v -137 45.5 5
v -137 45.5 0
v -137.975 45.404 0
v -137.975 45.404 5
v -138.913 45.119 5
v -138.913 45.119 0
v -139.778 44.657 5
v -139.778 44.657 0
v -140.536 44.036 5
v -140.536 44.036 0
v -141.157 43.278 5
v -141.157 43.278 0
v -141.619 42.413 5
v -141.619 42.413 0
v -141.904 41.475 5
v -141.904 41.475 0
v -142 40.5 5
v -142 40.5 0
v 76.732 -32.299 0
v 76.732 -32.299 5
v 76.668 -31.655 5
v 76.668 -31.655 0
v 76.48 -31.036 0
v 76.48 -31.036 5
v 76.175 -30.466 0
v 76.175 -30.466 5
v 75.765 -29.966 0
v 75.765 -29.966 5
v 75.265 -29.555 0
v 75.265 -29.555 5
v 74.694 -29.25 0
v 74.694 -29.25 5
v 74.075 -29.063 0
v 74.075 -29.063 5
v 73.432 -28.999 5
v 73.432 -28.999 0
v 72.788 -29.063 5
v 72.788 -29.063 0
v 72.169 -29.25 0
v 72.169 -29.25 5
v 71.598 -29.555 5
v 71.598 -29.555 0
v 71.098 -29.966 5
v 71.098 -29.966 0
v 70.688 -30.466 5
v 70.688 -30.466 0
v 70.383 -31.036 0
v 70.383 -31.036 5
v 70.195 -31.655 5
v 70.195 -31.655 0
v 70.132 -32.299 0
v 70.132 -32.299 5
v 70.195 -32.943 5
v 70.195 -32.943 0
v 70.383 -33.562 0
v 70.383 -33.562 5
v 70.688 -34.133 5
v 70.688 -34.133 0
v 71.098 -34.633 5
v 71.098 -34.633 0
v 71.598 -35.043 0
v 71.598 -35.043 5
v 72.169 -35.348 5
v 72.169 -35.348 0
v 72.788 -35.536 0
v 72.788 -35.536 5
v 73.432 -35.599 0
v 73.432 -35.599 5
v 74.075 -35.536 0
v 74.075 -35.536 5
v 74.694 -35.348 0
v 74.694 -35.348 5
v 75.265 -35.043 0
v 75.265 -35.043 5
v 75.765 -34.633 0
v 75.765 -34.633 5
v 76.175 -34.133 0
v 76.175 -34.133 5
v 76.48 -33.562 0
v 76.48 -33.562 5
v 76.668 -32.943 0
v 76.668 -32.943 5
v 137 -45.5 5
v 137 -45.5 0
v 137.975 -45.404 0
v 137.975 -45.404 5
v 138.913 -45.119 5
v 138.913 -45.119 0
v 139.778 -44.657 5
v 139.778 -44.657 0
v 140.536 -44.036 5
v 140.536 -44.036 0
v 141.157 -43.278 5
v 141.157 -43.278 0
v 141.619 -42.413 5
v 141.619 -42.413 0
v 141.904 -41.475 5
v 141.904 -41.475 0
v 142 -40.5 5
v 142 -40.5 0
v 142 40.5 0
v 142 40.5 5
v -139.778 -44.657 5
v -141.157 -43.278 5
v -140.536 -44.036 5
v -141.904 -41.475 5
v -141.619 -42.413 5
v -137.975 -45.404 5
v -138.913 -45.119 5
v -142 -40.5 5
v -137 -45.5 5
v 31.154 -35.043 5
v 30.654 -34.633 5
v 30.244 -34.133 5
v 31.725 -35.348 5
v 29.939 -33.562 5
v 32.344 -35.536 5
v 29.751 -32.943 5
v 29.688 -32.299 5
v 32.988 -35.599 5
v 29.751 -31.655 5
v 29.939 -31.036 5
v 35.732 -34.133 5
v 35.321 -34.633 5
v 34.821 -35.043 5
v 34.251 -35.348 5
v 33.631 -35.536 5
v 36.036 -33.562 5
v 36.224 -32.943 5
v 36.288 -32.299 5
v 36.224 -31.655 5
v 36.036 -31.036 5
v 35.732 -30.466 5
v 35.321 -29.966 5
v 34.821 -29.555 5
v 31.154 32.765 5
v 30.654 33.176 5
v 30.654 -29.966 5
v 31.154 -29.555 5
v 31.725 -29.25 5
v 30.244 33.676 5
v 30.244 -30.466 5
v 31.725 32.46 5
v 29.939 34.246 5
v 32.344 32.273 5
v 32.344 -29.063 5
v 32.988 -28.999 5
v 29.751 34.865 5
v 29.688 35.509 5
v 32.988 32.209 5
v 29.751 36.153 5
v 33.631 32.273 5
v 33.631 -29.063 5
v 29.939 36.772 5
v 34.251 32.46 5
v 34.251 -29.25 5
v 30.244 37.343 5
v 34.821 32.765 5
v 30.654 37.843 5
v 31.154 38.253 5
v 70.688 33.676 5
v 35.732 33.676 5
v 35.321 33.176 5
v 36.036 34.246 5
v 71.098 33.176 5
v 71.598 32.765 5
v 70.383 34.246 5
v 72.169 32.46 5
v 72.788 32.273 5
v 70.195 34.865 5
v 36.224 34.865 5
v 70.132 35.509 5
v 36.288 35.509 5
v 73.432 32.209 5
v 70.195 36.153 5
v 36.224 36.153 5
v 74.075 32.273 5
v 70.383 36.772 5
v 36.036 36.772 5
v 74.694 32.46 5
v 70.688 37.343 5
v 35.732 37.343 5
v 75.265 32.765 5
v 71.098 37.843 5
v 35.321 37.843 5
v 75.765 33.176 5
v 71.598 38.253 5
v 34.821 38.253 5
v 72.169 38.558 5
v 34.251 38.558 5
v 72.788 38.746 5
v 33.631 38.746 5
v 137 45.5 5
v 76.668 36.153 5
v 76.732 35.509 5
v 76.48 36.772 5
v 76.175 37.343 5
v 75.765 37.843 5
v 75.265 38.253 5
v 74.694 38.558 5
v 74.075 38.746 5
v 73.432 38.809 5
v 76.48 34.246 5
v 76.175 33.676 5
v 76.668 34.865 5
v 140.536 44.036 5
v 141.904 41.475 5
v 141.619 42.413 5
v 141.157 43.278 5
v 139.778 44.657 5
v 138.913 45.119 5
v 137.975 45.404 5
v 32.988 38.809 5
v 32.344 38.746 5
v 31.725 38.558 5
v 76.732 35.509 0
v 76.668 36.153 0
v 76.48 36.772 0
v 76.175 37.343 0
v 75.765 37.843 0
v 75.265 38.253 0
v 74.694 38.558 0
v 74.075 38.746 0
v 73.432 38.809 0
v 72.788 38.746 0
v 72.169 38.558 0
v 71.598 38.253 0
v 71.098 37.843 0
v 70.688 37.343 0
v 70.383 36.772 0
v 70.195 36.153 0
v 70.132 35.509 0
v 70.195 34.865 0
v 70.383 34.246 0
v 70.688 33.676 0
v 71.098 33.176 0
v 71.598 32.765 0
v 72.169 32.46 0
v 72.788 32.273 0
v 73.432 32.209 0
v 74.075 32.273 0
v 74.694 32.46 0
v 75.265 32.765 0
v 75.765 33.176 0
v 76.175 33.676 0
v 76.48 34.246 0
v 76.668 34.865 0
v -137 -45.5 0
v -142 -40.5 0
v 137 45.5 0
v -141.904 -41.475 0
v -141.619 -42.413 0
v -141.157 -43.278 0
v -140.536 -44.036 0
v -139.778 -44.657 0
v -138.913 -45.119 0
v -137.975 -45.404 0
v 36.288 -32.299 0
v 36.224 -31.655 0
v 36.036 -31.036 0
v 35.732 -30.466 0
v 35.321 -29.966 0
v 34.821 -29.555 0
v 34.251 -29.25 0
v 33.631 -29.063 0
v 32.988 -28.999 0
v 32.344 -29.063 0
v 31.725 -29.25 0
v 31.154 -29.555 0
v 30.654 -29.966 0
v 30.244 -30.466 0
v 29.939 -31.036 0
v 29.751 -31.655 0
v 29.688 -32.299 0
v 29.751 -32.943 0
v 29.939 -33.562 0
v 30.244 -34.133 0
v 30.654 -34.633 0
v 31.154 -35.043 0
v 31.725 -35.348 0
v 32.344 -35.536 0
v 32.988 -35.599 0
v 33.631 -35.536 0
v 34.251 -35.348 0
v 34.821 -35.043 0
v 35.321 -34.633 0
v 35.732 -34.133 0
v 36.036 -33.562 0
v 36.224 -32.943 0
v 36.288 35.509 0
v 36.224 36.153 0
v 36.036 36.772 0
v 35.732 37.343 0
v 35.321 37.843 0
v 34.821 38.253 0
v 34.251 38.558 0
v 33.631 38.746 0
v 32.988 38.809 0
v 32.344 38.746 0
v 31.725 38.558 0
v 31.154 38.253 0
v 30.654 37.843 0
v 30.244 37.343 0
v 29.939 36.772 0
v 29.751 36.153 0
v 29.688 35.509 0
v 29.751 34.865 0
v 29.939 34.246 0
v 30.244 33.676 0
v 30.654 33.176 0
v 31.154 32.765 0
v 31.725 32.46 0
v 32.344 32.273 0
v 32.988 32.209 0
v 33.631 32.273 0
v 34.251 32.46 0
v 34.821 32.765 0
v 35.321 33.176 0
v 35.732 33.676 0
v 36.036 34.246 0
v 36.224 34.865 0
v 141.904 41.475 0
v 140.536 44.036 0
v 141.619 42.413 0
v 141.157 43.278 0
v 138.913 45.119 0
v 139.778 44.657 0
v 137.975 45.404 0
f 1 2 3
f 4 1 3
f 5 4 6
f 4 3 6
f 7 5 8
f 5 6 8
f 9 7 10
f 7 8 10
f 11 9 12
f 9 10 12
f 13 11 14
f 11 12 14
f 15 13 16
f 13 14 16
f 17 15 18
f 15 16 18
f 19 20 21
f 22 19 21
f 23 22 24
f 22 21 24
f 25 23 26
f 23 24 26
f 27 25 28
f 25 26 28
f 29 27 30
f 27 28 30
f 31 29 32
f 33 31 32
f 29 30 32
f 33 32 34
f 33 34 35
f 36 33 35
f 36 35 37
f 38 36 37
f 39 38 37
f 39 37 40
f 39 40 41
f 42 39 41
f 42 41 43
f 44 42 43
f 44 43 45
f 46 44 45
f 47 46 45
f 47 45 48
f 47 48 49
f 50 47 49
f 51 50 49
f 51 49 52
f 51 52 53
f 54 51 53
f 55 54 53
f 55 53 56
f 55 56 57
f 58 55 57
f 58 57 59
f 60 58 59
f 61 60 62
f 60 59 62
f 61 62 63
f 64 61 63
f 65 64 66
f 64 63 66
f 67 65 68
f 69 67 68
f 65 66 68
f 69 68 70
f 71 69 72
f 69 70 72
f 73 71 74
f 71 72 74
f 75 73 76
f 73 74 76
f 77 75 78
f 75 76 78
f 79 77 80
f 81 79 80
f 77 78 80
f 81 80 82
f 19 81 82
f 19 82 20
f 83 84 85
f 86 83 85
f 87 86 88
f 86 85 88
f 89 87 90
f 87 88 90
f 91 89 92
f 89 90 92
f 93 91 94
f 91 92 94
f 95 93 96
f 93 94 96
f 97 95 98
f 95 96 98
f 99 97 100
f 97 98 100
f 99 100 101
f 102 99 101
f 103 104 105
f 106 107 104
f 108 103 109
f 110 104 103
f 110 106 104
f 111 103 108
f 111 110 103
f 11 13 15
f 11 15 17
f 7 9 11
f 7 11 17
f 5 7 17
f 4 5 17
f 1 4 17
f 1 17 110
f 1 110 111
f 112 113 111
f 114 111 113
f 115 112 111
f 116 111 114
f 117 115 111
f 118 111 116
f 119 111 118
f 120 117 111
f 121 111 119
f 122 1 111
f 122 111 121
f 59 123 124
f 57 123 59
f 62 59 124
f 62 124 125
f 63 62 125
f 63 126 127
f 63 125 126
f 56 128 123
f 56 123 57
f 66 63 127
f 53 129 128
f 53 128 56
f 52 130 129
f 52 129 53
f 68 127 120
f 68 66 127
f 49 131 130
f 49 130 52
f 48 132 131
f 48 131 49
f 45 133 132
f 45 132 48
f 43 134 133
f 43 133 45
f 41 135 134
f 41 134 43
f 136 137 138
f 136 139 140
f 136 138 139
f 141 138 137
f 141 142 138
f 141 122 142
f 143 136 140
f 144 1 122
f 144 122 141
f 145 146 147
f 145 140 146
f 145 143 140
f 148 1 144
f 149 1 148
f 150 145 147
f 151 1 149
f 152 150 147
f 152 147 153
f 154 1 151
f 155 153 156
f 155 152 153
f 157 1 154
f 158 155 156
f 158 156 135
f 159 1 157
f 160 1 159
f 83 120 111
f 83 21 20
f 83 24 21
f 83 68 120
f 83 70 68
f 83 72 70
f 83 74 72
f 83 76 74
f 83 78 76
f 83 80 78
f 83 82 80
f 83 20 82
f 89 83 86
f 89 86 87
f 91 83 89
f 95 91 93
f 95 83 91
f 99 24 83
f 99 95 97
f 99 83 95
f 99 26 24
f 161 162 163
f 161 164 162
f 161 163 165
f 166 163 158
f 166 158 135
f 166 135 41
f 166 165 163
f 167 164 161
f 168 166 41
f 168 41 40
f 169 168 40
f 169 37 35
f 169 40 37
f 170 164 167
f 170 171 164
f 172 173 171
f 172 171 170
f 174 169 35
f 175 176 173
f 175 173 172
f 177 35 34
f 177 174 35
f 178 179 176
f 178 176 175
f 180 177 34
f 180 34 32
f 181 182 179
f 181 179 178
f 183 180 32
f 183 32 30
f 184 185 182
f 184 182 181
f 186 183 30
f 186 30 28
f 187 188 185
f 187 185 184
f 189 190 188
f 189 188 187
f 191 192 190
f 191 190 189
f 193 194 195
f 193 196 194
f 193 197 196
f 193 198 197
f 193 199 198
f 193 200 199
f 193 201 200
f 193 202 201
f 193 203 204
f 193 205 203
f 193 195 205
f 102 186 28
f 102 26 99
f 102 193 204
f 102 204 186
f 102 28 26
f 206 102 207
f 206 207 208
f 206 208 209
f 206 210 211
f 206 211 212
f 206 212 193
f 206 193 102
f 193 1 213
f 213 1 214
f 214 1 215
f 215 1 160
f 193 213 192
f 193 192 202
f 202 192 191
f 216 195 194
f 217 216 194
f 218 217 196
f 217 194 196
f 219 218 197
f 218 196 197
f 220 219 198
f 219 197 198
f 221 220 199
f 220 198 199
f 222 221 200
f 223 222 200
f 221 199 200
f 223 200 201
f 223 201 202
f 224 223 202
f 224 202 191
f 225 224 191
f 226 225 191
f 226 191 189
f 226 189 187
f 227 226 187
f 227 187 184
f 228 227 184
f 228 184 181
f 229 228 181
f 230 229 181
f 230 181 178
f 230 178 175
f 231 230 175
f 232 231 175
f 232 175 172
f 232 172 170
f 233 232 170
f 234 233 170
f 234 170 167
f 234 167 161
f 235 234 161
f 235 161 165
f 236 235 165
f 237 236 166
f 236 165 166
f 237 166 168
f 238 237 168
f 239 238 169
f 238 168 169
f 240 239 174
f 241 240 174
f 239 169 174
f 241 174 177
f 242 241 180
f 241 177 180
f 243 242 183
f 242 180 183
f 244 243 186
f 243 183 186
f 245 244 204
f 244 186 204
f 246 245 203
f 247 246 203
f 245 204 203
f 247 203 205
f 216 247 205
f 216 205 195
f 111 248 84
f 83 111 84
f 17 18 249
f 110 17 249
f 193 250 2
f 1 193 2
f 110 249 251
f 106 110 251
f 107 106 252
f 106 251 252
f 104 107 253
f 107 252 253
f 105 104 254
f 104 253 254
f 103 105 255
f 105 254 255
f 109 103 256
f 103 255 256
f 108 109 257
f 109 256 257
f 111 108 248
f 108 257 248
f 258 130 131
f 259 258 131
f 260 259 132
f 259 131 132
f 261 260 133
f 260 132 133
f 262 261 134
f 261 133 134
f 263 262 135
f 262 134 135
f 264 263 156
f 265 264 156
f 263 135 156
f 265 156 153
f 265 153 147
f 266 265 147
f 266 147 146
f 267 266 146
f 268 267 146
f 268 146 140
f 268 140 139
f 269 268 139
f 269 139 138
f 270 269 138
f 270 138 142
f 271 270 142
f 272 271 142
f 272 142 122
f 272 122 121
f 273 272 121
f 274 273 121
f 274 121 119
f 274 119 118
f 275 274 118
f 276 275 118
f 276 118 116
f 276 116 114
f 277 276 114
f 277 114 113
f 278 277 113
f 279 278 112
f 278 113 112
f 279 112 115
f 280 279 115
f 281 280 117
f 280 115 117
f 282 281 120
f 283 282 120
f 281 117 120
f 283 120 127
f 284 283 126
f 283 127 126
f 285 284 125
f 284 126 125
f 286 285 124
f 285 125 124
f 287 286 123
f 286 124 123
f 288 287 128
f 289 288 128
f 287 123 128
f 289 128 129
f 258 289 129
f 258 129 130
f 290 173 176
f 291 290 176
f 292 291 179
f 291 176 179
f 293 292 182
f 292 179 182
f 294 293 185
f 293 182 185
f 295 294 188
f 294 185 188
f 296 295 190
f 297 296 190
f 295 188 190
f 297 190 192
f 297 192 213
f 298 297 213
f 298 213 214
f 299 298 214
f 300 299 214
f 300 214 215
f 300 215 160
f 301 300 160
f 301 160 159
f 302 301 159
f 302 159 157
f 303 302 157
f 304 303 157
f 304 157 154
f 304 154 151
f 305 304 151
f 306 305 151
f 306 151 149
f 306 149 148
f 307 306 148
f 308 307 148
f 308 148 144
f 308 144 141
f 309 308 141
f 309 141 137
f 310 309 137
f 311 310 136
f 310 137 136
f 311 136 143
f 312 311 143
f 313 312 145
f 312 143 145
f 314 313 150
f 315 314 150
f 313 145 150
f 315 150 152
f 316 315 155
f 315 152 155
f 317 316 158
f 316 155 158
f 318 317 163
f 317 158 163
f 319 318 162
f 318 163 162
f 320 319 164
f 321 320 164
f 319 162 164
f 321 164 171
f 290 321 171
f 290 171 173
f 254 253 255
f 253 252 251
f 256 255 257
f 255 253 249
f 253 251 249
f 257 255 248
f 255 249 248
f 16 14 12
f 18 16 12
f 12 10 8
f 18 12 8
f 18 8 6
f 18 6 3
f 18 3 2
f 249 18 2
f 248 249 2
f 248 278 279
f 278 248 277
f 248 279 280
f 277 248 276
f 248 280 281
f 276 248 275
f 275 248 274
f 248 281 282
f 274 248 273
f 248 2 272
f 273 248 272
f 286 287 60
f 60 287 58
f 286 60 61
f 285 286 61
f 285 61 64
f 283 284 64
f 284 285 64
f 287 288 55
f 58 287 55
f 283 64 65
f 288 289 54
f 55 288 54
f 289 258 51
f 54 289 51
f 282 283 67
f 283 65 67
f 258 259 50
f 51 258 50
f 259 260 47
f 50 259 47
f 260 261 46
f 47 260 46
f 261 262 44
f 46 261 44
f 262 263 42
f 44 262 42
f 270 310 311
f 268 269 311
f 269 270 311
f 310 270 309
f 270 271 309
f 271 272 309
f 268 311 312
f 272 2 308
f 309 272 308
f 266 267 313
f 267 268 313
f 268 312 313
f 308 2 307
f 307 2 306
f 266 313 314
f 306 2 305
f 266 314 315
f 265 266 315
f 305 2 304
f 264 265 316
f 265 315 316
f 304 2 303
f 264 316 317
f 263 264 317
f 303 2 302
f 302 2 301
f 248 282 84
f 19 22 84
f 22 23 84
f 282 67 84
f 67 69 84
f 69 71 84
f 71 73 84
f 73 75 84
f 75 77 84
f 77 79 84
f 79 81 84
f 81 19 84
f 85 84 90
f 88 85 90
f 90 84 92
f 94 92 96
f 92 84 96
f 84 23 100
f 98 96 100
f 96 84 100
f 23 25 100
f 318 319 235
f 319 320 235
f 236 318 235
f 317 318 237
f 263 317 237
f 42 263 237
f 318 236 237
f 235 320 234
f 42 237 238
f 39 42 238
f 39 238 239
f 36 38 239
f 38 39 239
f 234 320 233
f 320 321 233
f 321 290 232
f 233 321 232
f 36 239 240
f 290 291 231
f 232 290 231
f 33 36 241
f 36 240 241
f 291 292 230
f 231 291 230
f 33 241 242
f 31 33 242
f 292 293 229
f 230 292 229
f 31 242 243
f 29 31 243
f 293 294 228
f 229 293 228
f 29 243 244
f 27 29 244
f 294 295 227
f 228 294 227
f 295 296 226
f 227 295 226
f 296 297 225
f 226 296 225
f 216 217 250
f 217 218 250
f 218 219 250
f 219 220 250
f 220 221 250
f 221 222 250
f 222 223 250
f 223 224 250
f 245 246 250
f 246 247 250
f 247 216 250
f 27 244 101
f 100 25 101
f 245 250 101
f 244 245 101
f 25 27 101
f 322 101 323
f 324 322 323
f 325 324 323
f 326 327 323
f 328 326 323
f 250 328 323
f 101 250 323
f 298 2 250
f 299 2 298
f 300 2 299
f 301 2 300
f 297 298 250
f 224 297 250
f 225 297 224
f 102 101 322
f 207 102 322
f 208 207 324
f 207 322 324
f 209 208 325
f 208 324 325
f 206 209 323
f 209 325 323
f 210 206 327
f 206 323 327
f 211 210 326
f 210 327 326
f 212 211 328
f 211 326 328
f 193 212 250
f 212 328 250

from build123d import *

# Parameters (mm, degrees)
BOSS_EXTRUDE1_DEPTH      = 5
M6_CLEARANCE_HOLE2_D     = 6.6
M6_CLEARANCE_HOLE2_DEPTH = 6
M6_CLEARANCE_HOLE2_TIP   = 1.982840043


with BuildPart() as part:
    # Sketch1 → Boss-Extrude1 (new body)
    with BuildSketch(Plane.XY):
        with BuildLine():
            Line((-137, -45.5), (137, -45.5))
            ThreePointArc((137, -45.5), (140.535533906, -44.035533906), (142, -40.5))
            Line((142, -40.5), (142, 40.5))
            ThreePointArc((142, 40.5), (140.535533906, 44.035533906), (137, 45.5))
            Line((137, 45.5), (-137, 45.5))
            ThreePointArc((-137, 45.5), (-140.535533906, 44.035533906), (-142, 40.5))
            Line((-142, 40.5), (-142, -40.5))
            ThreePointArc((-142, -40.5), (-140.535533906, -44.035533906), (-137, -45.5))
        make_face()
    extrude(amount=BOSS_EXTRUDE1_DEPTH)

    # M6 Clearance Hole2
    with Locations(Plane(origin=(0, 0, 0), x_dir=(-1, 0, 0), z_dir=(0, 0, -1))):
        with Locations((-73.431614003, -32.299177438), (-32.987686721, -32.299177438), (-32.987686721, 35.509212796), (-73.431614003, 35.509212796)):
            Hole(M6_CLEARANCE_HOLE2_D / 2, depth=M6_CLEARANCE_HOLE2_DEPTH)
            with Locations((0, 0, -(M6_CLEARANCE_HOLE2_DEPTH + M6_CLEARANCE_HOLE2_TIP / 2))):  # 118° drill point
                Cone(0, M6_CLEARANCE_HOLE2_D / 2, M6_CLEARANCE_HOLE2_TIP, mode=Mode.SUBTRACT)


solid = part.part
